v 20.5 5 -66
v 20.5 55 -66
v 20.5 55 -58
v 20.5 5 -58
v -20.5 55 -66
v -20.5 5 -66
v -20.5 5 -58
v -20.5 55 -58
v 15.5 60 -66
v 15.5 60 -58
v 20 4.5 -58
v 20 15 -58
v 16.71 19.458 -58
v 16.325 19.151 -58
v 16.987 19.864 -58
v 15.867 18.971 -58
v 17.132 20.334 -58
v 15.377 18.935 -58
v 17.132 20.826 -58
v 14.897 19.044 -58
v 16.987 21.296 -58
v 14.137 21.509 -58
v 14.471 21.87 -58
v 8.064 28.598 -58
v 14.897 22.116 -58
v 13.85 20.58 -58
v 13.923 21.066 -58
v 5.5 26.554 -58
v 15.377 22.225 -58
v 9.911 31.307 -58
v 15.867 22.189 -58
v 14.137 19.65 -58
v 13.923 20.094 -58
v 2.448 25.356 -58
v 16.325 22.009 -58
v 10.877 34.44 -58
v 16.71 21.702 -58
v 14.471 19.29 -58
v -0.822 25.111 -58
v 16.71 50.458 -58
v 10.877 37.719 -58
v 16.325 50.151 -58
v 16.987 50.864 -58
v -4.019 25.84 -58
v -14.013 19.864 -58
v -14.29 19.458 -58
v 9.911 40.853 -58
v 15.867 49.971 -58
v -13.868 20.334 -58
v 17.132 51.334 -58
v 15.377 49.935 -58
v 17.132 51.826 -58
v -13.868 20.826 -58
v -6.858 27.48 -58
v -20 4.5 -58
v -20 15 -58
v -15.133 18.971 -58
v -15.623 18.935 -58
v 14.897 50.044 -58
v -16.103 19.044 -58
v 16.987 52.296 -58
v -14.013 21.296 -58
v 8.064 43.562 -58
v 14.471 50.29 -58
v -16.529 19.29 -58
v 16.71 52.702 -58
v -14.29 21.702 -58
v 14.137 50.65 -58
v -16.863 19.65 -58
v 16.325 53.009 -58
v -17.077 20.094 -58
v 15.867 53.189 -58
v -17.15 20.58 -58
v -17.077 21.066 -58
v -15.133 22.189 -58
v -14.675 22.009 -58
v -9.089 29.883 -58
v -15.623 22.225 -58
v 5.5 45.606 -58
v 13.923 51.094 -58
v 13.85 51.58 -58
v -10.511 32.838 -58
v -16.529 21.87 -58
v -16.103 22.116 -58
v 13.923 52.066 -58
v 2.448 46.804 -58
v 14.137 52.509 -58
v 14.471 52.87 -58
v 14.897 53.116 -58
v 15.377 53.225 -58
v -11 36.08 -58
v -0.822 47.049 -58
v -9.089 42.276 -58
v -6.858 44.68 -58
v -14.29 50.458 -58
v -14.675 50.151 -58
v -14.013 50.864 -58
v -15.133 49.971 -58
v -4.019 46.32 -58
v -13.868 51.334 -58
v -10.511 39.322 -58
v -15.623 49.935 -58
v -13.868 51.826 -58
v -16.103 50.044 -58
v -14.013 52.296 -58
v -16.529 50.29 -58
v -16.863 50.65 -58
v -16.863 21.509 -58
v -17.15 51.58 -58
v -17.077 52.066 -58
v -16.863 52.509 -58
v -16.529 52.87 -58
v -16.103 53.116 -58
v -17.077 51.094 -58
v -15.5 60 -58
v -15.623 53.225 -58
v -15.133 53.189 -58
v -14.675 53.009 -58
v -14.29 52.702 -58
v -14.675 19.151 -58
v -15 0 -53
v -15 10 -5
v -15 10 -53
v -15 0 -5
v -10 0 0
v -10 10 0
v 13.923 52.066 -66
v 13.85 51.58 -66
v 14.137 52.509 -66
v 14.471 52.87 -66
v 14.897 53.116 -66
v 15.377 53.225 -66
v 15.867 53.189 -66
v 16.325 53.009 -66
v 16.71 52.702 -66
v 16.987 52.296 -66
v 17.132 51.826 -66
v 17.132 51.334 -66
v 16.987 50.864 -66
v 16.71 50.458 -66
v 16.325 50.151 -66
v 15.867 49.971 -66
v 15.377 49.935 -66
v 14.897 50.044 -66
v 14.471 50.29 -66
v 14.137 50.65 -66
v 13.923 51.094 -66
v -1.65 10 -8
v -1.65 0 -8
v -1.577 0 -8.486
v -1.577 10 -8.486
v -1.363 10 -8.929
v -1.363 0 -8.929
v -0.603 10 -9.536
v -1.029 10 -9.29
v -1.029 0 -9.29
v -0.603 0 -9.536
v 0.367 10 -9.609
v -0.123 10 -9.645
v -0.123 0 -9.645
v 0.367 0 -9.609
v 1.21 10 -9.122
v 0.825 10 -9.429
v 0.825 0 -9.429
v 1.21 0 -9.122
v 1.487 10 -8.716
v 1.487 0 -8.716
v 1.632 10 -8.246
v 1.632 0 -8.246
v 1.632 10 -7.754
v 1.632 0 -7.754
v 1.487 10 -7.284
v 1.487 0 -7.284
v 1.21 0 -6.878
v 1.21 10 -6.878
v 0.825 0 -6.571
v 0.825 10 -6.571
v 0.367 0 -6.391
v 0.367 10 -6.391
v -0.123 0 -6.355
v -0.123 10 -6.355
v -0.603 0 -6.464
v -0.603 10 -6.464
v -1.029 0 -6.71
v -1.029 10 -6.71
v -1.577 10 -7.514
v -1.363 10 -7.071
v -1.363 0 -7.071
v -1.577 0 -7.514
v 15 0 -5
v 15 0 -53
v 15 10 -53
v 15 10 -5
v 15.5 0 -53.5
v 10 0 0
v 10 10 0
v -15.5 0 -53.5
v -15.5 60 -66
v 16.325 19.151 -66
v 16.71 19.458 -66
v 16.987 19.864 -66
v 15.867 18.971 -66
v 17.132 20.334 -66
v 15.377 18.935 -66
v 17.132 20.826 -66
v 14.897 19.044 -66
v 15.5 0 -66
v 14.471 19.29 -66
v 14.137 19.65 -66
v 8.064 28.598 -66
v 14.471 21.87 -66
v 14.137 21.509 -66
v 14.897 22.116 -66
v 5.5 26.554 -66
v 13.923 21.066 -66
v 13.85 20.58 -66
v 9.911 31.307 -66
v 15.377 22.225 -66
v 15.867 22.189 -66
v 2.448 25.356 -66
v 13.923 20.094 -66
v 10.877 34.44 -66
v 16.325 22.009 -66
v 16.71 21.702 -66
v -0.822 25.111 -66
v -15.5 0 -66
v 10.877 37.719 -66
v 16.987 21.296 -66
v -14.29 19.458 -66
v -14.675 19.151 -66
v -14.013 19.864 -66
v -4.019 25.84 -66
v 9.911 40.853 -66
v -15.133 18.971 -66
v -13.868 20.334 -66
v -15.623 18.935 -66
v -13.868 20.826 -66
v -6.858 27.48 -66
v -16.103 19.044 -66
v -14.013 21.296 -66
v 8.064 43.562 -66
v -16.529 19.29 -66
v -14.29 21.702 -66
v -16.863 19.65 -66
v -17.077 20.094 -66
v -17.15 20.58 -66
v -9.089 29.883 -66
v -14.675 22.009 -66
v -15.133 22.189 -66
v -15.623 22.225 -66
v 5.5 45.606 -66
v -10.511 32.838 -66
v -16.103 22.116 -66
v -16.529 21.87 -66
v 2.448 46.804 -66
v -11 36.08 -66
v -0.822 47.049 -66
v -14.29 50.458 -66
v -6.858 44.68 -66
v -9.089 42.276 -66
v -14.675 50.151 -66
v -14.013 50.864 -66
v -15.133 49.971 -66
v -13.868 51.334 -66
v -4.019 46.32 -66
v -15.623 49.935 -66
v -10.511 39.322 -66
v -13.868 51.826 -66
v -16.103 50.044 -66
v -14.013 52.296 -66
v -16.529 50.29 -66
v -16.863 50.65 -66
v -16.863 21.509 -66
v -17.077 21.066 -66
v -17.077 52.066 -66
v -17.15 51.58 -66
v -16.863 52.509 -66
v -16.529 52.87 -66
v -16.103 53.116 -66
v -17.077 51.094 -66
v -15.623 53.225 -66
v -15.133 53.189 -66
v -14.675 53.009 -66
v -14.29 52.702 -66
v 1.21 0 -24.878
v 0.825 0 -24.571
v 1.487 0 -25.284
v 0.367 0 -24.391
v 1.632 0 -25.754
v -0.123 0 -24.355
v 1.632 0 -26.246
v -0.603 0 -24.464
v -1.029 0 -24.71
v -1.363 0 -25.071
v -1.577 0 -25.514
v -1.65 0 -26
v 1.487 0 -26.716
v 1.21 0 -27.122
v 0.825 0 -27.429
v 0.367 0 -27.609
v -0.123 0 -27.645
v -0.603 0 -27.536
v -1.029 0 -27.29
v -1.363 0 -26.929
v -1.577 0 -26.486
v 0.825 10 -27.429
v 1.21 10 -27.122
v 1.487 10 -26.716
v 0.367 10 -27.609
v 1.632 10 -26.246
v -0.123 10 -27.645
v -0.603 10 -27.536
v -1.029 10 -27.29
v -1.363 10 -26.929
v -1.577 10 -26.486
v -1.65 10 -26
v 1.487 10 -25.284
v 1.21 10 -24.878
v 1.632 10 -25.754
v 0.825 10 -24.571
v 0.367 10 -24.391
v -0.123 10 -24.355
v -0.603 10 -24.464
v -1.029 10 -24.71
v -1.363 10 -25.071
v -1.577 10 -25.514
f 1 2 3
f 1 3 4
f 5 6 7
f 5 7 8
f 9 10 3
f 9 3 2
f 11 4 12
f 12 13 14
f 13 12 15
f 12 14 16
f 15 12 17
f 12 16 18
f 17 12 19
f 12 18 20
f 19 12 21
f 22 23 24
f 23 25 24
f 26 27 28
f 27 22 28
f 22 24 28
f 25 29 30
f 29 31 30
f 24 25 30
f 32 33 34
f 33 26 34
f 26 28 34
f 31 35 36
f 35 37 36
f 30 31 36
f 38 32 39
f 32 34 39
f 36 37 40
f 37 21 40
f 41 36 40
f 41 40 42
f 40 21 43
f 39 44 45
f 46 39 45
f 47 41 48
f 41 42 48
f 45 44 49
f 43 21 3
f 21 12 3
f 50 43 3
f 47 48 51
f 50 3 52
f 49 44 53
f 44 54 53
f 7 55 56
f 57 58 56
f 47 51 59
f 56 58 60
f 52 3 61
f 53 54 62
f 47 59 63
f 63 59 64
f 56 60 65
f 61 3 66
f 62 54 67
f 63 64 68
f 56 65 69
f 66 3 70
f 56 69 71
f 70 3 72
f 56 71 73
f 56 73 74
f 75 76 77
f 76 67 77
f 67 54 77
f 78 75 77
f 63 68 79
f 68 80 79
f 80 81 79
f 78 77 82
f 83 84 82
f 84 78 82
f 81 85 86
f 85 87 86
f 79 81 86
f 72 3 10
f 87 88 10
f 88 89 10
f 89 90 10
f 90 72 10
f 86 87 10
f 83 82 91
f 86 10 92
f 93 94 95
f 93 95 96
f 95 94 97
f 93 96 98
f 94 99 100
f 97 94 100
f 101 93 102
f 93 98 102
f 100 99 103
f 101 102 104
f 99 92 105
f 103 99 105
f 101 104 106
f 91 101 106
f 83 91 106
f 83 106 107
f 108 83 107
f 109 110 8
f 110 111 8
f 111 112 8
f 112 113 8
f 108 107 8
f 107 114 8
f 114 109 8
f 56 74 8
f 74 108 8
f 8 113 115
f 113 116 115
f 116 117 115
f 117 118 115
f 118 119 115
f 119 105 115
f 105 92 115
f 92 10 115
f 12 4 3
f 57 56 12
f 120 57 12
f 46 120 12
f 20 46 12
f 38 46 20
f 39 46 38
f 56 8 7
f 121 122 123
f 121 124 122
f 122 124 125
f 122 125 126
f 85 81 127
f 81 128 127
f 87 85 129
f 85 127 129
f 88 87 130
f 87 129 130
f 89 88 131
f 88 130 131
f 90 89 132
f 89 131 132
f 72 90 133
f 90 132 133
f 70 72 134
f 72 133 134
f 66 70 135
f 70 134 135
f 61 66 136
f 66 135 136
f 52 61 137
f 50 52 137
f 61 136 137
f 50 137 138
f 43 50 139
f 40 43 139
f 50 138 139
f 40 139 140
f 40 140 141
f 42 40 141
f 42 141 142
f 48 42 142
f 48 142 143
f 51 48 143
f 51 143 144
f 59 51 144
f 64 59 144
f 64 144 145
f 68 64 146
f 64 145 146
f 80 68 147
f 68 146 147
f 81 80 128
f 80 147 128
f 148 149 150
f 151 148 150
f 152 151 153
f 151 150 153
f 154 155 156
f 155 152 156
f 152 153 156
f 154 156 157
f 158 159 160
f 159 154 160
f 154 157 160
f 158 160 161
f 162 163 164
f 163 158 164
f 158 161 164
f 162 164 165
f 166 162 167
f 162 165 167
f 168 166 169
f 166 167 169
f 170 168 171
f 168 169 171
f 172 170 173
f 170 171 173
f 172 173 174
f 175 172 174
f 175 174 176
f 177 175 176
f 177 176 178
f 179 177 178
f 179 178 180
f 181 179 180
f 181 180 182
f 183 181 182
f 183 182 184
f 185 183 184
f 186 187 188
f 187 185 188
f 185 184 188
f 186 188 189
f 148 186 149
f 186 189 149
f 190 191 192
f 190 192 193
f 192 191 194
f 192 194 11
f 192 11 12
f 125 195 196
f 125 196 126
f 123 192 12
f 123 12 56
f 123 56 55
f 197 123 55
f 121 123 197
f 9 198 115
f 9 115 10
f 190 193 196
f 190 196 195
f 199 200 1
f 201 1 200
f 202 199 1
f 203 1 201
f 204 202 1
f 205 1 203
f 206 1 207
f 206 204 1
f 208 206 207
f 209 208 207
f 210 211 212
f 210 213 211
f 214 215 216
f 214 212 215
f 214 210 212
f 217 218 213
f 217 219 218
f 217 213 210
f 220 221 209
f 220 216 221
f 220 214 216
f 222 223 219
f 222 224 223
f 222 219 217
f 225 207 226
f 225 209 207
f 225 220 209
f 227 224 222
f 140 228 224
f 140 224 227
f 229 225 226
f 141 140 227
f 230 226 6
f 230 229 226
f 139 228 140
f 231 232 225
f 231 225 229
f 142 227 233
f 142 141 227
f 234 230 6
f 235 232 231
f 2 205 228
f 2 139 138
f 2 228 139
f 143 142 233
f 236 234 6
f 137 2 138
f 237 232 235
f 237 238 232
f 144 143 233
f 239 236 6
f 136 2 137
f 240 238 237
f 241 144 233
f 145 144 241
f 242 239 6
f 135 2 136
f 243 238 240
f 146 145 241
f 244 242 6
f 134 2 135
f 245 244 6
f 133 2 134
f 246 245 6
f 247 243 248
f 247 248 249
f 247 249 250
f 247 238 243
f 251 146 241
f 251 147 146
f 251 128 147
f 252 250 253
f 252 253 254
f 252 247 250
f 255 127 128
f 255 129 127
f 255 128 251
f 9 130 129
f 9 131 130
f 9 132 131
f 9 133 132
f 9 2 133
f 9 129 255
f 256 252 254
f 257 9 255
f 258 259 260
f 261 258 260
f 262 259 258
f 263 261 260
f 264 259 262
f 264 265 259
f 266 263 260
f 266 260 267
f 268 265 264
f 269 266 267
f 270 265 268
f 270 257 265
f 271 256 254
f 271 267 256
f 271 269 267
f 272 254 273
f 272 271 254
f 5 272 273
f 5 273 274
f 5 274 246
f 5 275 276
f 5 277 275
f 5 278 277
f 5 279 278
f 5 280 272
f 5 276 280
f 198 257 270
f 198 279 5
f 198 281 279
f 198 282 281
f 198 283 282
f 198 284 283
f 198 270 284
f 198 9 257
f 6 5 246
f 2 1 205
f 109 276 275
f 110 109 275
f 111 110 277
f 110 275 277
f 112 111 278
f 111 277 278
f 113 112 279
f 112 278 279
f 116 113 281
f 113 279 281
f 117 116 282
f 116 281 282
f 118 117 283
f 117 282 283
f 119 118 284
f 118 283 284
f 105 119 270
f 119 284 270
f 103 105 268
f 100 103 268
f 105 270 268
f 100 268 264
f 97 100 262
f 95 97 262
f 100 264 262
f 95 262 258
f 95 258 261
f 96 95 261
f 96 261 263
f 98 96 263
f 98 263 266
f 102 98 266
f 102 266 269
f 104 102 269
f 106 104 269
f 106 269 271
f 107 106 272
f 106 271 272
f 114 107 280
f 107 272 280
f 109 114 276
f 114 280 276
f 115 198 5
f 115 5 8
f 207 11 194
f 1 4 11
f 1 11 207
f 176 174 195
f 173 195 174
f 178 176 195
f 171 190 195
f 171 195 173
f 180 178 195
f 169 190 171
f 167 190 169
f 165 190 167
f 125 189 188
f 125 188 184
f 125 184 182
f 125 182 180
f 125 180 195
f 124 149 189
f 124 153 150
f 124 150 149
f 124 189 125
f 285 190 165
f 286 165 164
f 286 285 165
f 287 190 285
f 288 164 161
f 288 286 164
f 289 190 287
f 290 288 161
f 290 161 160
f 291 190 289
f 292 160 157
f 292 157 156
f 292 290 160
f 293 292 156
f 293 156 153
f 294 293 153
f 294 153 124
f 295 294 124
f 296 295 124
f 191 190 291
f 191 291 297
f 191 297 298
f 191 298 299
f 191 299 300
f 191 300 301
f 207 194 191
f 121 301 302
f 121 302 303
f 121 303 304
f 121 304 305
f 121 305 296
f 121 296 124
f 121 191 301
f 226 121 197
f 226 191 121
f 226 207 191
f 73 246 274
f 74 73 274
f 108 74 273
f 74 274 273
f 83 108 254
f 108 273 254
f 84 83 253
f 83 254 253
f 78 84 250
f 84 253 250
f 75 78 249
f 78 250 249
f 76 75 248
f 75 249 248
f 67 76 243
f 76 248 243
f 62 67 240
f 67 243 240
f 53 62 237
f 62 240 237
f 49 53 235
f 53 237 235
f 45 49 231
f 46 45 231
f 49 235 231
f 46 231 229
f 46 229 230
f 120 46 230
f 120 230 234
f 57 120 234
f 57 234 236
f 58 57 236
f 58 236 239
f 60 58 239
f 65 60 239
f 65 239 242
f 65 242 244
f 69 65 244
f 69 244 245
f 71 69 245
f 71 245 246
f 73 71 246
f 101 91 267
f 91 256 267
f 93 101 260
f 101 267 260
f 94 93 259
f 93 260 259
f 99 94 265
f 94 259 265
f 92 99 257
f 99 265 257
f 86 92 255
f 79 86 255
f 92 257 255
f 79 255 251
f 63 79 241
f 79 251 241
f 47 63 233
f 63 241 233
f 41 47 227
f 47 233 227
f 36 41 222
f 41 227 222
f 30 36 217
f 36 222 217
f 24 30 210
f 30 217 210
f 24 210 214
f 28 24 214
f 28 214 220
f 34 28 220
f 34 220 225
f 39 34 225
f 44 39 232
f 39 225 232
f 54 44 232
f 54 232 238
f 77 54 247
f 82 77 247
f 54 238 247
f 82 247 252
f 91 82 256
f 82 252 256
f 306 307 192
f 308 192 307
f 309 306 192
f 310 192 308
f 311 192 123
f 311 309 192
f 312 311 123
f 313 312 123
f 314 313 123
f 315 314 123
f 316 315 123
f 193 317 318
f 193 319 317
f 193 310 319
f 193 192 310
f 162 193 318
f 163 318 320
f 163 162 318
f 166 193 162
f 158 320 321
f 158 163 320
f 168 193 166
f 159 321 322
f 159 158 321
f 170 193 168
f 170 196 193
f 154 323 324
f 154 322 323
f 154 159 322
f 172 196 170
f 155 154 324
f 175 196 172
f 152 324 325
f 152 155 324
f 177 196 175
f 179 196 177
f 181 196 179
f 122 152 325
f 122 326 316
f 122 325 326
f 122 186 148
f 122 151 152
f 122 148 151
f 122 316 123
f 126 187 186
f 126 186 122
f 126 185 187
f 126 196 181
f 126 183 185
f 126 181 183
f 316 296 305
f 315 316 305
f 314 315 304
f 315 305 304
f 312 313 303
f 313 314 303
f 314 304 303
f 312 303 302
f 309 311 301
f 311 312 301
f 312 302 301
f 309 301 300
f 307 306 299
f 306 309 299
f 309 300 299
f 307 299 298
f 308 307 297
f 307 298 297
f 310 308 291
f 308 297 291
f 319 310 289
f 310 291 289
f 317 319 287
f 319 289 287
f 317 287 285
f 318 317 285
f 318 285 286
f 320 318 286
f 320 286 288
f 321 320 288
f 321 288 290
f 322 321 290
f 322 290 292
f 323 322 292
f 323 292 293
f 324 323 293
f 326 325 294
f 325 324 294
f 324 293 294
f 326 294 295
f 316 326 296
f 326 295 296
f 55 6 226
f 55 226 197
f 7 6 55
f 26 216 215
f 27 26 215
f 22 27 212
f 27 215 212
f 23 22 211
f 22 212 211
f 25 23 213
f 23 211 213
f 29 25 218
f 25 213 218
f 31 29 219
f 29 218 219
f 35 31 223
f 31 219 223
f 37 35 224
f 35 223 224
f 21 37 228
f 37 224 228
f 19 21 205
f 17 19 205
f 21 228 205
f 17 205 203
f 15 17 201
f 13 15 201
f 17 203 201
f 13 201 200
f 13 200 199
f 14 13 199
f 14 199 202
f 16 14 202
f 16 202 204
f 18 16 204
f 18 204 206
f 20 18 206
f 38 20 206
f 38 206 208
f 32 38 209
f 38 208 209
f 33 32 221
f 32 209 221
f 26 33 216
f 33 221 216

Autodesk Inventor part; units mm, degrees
ref_plane "YZ Plane" through (0, 0, 0) normal (1, 0, 0) x (0, 1, 0)
ref_plane "XZ Plane" through (0, 0, 0) normal (0, 1, 0) x (-1, 0, 0)
ref_plane "XY Plane" through (0, 0, 0) normal (0, 0, 1) x (1, 0, 0)
sketch "Sketch1" plane through (0, 0, 0) normal (0, 1, 0) x (-1, 0, 0)
  line L0 (-15, 0) -> (15, 0)
  line L1 (15, 0) -> (15, -66)
  line L2 (15, -66) -> (-15, -66)
  line L3 (-15, -66) -> (-15, 0)
  circle A0 centre (0, -8) radius 1.65
  circle A1 centre (0, -26) radius 1.65
  point P0 (0, 0)
  point P1 (0, 0)
  dimension "d0" = 66
  dimension "d1" = 30
  dimension "d2" = 3.3
  dimension "d3" = 3.3
  dimension "d4" = 18
  dimension "d5" = 8
extrude "Extrusion1" add sketch "Sketch1" along normal blind 10
chamfer "Chamfer1" distance 5 angle 45 2 edges at (15, 5, 0) (-15, 5, 0)
sketch "Sketch2" plane through (15, 0, -66) normal (0, 0, -1) x (-1, 0, 0)
  line L0 (0, 0) -> (30, 0) projected
  line L1 (30, 0) -> (30, 10) projected
  line L2 (0, 10) -> (30, 10) projected
  line L3 (0, 0) -> (0, 10) projected
  line L4 (15, 0) -> (15, -14)
  line L5 (15, -14) -> (61, -14)
  line L6 (61, -14) -> (15, 36.0799)
  line L7 (15, 0) -> (15, 57.2033) construction
  circle A0 centre (15, 36.0799) radius 11
  line L8 (-0.5, 20.5799) -> (30.5, 20.5799) construction
  line L9 (30.5, 20.5799) -> (30.5, 51.5799) construction
  line L10 (30.5, 51.5799) -> (-0.5, 51.5799) construction
  line L11 (-0.5, 51.5799) -> (-0.5, 20.5799) construction
  line L12 (-0.5, 20.5799) -> (30.5, 51.5799) construction
  line L13 (30.5, 20.5799) -> (-0.5, 51.5799) construction
  circle A1 centre (-0.5, 51.5799) radius 1.65
  circle A2 centre (30.5, 51.5799) radius 1.65
  circle A3 centre (30.5, 20.5799) radius 1.65
  circle A4 centre (-0.5, 20.5799) radius 1.65
  line L14 (-5.5, 0) -> (35.5, 0)
  line L15 (35.5, 0) -> (35.5, 60)
  line L16 (35.5, 60) -> (-5.5, 60)
  line L17 (-5.5, 60) -> (-5.5, 0)
  dimension "d11" = 14
  dimension "d12" = 46
  dimension "d13" = 68
  dimension "d14" = 22
  dimension "d15" = 31
  dimension "d16" = 31
  dimension "d17" = 3.3
  dimension "d18" = 60
  dimension "d19" = 41
extrude "Extrusion2" add sketch "Sketch2" against normal blind 8 contours L14 L17 L16 L15 L1 L2 L3
chamfer "Chamfer2" distance 5 angle 45 7 edges at (20.5, 60, -62) (-20.5, 60, -62) (20.5, 0, -62) (15, 5, -58) (-15, 5, -58) (-20.5, 0, -62) (0, 10, -58)
properties part number "SOPORTE_NEMA_2" material "Steel, Mild, Welded"
